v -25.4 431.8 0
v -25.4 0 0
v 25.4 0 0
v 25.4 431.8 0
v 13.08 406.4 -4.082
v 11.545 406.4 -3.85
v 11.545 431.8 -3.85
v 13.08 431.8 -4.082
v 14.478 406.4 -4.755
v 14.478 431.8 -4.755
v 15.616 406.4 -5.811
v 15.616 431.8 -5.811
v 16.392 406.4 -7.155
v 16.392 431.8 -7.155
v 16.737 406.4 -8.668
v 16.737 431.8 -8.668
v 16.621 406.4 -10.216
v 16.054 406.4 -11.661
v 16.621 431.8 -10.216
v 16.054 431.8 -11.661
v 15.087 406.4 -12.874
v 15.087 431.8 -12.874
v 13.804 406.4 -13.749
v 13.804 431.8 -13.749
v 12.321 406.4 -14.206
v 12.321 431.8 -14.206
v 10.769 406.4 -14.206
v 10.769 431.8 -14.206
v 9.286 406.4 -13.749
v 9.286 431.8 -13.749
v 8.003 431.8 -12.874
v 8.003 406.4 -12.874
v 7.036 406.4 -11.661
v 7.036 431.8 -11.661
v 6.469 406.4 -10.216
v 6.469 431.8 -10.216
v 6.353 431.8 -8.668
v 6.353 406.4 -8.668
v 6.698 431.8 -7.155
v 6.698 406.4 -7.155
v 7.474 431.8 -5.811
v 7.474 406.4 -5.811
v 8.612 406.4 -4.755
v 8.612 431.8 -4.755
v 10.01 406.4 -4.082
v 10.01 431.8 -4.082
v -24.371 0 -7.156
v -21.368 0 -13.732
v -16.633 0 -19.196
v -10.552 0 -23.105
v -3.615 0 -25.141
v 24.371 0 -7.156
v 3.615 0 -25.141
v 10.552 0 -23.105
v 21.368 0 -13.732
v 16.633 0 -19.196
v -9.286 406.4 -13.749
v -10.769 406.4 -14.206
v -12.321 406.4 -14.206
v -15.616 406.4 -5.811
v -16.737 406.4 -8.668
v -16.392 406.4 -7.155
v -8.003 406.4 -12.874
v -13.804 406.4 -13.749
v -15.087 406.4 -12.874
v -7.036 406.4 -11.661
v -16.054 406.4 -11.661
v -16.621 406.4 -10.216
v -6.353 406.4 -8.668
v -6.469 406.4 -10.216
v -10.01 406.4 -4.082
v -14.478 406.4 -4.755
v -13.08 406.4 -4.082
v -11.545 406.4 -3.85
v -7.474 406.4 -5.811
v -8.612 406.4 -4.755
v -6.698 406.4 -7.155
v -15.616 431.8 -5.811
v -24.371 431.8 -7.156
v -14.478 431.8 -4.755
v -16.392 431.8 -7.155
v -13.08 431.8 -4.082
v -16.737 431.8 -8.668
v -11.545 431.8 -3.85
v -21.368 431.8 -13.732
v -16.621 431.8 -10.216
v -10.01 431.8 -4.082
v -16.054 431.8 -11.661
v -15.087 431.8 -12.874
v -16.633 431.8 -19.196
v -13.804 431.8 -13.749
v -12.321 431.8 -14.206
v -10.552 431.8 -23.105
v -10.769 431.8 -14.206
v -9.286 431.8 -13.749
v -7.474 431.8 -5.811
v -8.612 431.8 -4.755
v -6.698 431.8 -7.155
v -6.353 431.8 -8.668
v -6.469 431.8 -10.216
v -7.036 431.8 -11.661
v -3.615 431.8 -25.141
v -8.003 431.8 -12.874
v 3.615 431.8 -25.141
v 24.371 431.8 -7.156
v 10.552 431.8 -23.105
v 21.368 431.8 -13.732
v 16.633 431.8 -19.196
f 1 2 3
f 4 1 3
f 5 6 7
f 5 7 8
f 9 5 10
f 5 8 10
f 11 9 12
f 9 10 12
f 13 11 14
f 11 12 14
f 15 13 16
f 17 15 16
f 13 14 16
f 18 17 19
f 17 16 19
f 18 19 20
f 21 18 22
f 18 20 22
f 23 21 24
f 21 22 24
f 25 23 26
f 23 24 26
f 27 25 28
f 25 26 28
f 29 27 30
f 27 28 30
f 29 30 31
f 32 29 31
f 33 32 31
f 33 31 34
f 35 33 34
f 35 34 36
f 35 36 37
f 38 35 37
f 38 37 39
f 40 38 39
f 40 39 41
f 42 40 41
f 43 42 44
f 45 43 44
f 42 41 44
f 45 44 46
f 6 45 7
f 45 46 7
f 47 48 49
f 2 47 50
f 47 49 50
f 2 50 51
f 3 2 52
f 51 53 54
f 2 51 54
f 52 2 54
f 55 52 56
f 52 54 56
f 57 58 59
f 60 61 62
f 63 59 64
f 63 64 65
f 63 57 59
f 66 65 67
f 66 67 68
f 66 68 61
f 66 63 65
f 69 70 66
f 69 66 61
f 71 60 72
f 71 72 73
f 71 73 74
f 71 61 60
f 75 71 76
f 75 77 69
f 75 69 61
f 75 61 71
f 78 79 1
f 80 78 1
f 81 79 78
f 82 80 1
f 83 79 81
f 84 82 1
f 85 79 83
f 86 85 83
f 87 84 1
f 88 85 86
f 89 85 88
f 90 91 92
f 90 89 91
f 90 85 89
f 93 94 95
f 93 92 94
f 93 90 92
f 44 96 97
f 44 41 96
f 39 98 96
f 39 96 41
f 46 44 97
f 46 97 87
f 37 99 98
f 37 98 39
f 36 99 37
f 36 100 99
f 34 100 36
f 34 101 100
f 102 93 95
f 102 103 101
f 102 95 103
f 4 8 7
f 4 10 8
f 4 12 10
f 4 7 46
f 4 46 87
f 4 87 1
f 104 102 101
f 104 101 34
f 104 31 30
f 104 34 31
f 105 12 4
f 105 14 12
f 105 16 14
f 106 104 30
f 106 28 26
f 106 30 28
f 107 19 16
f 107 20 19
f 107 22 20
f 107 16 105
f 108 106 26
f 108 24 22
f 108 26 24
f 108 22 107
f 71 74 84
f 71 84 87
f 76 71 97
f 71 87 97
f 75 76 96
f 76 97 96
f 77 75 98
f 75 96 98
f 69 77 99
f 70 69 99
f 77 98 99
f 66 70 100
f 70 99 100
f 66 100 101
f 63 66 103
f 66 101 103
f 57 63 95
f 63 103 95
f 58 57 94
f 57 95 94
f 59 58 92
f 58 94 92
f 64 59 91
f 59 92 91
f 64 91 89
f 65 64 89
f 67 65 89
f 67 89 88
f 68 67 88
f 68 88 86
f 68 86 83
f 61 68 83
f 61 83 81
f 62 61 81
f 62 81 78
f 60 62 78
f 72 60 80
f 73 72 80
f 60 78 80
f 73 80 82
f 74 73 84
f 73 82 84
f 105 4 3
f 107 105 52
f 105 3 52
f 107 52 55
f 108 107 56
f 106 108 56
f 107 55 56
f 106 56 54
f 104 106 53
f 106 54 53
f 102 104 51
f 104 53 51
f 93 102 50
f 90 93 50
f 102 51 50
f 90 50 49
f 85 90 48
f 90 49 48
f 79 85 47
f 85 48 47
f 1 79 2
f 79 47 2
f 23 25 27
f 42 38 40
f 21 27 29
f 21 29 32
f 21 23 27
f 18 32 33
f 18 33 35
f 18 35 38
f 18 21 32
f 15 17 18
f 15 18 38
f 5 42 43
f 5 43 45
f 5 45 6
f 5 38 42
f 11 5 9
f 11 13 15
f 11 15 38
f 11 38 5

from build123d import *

# Parameters (mm, degrees)
BOSS_EXTRUDE1_DEPTH = 431.8
SKETCH2_R           = 5.207
CUT_EXTRUDE1_DEPTH  = 25.4


with BuildPart() as part:
    # Sketch1 → Boss-Extrude1 (new body)
    with BuildSketch(Plane(origin=(0, 0, 0), x_dir=(1, 0, 0), z_dir=(0, 1, 0))):
        with BuildLine():
            Line((-25.4, 0), (25.4, 0))
            ThreePointArc((25.4, 0), (0, 25.4), (-25.4, 0))
        make_face()
    extrude(amount=BOSS_EXTRUDE1_DEPTH)

    # Sketch2 → Cut-Extrude1 (cut)
    with BuildSketch(Plane(origin=(0, 431.8, 0), x_dir=(1, 0, 0), z_dir=(0, 1, 0))):
        with Locations(Location((-11.54495024, 9.057446198, 0), (0, 0, 270))):
            Circle(SKETCH2_R)
        with Locations(Location((11.54495024, 9.057446198, 0), (0, 0, 270))):
            Circle(SKETCH2_R)
    extrude(amount=-CUT_EXTRUDE1_DEPTH, mode=Mode.SUBTRACT)


solid = part.part
